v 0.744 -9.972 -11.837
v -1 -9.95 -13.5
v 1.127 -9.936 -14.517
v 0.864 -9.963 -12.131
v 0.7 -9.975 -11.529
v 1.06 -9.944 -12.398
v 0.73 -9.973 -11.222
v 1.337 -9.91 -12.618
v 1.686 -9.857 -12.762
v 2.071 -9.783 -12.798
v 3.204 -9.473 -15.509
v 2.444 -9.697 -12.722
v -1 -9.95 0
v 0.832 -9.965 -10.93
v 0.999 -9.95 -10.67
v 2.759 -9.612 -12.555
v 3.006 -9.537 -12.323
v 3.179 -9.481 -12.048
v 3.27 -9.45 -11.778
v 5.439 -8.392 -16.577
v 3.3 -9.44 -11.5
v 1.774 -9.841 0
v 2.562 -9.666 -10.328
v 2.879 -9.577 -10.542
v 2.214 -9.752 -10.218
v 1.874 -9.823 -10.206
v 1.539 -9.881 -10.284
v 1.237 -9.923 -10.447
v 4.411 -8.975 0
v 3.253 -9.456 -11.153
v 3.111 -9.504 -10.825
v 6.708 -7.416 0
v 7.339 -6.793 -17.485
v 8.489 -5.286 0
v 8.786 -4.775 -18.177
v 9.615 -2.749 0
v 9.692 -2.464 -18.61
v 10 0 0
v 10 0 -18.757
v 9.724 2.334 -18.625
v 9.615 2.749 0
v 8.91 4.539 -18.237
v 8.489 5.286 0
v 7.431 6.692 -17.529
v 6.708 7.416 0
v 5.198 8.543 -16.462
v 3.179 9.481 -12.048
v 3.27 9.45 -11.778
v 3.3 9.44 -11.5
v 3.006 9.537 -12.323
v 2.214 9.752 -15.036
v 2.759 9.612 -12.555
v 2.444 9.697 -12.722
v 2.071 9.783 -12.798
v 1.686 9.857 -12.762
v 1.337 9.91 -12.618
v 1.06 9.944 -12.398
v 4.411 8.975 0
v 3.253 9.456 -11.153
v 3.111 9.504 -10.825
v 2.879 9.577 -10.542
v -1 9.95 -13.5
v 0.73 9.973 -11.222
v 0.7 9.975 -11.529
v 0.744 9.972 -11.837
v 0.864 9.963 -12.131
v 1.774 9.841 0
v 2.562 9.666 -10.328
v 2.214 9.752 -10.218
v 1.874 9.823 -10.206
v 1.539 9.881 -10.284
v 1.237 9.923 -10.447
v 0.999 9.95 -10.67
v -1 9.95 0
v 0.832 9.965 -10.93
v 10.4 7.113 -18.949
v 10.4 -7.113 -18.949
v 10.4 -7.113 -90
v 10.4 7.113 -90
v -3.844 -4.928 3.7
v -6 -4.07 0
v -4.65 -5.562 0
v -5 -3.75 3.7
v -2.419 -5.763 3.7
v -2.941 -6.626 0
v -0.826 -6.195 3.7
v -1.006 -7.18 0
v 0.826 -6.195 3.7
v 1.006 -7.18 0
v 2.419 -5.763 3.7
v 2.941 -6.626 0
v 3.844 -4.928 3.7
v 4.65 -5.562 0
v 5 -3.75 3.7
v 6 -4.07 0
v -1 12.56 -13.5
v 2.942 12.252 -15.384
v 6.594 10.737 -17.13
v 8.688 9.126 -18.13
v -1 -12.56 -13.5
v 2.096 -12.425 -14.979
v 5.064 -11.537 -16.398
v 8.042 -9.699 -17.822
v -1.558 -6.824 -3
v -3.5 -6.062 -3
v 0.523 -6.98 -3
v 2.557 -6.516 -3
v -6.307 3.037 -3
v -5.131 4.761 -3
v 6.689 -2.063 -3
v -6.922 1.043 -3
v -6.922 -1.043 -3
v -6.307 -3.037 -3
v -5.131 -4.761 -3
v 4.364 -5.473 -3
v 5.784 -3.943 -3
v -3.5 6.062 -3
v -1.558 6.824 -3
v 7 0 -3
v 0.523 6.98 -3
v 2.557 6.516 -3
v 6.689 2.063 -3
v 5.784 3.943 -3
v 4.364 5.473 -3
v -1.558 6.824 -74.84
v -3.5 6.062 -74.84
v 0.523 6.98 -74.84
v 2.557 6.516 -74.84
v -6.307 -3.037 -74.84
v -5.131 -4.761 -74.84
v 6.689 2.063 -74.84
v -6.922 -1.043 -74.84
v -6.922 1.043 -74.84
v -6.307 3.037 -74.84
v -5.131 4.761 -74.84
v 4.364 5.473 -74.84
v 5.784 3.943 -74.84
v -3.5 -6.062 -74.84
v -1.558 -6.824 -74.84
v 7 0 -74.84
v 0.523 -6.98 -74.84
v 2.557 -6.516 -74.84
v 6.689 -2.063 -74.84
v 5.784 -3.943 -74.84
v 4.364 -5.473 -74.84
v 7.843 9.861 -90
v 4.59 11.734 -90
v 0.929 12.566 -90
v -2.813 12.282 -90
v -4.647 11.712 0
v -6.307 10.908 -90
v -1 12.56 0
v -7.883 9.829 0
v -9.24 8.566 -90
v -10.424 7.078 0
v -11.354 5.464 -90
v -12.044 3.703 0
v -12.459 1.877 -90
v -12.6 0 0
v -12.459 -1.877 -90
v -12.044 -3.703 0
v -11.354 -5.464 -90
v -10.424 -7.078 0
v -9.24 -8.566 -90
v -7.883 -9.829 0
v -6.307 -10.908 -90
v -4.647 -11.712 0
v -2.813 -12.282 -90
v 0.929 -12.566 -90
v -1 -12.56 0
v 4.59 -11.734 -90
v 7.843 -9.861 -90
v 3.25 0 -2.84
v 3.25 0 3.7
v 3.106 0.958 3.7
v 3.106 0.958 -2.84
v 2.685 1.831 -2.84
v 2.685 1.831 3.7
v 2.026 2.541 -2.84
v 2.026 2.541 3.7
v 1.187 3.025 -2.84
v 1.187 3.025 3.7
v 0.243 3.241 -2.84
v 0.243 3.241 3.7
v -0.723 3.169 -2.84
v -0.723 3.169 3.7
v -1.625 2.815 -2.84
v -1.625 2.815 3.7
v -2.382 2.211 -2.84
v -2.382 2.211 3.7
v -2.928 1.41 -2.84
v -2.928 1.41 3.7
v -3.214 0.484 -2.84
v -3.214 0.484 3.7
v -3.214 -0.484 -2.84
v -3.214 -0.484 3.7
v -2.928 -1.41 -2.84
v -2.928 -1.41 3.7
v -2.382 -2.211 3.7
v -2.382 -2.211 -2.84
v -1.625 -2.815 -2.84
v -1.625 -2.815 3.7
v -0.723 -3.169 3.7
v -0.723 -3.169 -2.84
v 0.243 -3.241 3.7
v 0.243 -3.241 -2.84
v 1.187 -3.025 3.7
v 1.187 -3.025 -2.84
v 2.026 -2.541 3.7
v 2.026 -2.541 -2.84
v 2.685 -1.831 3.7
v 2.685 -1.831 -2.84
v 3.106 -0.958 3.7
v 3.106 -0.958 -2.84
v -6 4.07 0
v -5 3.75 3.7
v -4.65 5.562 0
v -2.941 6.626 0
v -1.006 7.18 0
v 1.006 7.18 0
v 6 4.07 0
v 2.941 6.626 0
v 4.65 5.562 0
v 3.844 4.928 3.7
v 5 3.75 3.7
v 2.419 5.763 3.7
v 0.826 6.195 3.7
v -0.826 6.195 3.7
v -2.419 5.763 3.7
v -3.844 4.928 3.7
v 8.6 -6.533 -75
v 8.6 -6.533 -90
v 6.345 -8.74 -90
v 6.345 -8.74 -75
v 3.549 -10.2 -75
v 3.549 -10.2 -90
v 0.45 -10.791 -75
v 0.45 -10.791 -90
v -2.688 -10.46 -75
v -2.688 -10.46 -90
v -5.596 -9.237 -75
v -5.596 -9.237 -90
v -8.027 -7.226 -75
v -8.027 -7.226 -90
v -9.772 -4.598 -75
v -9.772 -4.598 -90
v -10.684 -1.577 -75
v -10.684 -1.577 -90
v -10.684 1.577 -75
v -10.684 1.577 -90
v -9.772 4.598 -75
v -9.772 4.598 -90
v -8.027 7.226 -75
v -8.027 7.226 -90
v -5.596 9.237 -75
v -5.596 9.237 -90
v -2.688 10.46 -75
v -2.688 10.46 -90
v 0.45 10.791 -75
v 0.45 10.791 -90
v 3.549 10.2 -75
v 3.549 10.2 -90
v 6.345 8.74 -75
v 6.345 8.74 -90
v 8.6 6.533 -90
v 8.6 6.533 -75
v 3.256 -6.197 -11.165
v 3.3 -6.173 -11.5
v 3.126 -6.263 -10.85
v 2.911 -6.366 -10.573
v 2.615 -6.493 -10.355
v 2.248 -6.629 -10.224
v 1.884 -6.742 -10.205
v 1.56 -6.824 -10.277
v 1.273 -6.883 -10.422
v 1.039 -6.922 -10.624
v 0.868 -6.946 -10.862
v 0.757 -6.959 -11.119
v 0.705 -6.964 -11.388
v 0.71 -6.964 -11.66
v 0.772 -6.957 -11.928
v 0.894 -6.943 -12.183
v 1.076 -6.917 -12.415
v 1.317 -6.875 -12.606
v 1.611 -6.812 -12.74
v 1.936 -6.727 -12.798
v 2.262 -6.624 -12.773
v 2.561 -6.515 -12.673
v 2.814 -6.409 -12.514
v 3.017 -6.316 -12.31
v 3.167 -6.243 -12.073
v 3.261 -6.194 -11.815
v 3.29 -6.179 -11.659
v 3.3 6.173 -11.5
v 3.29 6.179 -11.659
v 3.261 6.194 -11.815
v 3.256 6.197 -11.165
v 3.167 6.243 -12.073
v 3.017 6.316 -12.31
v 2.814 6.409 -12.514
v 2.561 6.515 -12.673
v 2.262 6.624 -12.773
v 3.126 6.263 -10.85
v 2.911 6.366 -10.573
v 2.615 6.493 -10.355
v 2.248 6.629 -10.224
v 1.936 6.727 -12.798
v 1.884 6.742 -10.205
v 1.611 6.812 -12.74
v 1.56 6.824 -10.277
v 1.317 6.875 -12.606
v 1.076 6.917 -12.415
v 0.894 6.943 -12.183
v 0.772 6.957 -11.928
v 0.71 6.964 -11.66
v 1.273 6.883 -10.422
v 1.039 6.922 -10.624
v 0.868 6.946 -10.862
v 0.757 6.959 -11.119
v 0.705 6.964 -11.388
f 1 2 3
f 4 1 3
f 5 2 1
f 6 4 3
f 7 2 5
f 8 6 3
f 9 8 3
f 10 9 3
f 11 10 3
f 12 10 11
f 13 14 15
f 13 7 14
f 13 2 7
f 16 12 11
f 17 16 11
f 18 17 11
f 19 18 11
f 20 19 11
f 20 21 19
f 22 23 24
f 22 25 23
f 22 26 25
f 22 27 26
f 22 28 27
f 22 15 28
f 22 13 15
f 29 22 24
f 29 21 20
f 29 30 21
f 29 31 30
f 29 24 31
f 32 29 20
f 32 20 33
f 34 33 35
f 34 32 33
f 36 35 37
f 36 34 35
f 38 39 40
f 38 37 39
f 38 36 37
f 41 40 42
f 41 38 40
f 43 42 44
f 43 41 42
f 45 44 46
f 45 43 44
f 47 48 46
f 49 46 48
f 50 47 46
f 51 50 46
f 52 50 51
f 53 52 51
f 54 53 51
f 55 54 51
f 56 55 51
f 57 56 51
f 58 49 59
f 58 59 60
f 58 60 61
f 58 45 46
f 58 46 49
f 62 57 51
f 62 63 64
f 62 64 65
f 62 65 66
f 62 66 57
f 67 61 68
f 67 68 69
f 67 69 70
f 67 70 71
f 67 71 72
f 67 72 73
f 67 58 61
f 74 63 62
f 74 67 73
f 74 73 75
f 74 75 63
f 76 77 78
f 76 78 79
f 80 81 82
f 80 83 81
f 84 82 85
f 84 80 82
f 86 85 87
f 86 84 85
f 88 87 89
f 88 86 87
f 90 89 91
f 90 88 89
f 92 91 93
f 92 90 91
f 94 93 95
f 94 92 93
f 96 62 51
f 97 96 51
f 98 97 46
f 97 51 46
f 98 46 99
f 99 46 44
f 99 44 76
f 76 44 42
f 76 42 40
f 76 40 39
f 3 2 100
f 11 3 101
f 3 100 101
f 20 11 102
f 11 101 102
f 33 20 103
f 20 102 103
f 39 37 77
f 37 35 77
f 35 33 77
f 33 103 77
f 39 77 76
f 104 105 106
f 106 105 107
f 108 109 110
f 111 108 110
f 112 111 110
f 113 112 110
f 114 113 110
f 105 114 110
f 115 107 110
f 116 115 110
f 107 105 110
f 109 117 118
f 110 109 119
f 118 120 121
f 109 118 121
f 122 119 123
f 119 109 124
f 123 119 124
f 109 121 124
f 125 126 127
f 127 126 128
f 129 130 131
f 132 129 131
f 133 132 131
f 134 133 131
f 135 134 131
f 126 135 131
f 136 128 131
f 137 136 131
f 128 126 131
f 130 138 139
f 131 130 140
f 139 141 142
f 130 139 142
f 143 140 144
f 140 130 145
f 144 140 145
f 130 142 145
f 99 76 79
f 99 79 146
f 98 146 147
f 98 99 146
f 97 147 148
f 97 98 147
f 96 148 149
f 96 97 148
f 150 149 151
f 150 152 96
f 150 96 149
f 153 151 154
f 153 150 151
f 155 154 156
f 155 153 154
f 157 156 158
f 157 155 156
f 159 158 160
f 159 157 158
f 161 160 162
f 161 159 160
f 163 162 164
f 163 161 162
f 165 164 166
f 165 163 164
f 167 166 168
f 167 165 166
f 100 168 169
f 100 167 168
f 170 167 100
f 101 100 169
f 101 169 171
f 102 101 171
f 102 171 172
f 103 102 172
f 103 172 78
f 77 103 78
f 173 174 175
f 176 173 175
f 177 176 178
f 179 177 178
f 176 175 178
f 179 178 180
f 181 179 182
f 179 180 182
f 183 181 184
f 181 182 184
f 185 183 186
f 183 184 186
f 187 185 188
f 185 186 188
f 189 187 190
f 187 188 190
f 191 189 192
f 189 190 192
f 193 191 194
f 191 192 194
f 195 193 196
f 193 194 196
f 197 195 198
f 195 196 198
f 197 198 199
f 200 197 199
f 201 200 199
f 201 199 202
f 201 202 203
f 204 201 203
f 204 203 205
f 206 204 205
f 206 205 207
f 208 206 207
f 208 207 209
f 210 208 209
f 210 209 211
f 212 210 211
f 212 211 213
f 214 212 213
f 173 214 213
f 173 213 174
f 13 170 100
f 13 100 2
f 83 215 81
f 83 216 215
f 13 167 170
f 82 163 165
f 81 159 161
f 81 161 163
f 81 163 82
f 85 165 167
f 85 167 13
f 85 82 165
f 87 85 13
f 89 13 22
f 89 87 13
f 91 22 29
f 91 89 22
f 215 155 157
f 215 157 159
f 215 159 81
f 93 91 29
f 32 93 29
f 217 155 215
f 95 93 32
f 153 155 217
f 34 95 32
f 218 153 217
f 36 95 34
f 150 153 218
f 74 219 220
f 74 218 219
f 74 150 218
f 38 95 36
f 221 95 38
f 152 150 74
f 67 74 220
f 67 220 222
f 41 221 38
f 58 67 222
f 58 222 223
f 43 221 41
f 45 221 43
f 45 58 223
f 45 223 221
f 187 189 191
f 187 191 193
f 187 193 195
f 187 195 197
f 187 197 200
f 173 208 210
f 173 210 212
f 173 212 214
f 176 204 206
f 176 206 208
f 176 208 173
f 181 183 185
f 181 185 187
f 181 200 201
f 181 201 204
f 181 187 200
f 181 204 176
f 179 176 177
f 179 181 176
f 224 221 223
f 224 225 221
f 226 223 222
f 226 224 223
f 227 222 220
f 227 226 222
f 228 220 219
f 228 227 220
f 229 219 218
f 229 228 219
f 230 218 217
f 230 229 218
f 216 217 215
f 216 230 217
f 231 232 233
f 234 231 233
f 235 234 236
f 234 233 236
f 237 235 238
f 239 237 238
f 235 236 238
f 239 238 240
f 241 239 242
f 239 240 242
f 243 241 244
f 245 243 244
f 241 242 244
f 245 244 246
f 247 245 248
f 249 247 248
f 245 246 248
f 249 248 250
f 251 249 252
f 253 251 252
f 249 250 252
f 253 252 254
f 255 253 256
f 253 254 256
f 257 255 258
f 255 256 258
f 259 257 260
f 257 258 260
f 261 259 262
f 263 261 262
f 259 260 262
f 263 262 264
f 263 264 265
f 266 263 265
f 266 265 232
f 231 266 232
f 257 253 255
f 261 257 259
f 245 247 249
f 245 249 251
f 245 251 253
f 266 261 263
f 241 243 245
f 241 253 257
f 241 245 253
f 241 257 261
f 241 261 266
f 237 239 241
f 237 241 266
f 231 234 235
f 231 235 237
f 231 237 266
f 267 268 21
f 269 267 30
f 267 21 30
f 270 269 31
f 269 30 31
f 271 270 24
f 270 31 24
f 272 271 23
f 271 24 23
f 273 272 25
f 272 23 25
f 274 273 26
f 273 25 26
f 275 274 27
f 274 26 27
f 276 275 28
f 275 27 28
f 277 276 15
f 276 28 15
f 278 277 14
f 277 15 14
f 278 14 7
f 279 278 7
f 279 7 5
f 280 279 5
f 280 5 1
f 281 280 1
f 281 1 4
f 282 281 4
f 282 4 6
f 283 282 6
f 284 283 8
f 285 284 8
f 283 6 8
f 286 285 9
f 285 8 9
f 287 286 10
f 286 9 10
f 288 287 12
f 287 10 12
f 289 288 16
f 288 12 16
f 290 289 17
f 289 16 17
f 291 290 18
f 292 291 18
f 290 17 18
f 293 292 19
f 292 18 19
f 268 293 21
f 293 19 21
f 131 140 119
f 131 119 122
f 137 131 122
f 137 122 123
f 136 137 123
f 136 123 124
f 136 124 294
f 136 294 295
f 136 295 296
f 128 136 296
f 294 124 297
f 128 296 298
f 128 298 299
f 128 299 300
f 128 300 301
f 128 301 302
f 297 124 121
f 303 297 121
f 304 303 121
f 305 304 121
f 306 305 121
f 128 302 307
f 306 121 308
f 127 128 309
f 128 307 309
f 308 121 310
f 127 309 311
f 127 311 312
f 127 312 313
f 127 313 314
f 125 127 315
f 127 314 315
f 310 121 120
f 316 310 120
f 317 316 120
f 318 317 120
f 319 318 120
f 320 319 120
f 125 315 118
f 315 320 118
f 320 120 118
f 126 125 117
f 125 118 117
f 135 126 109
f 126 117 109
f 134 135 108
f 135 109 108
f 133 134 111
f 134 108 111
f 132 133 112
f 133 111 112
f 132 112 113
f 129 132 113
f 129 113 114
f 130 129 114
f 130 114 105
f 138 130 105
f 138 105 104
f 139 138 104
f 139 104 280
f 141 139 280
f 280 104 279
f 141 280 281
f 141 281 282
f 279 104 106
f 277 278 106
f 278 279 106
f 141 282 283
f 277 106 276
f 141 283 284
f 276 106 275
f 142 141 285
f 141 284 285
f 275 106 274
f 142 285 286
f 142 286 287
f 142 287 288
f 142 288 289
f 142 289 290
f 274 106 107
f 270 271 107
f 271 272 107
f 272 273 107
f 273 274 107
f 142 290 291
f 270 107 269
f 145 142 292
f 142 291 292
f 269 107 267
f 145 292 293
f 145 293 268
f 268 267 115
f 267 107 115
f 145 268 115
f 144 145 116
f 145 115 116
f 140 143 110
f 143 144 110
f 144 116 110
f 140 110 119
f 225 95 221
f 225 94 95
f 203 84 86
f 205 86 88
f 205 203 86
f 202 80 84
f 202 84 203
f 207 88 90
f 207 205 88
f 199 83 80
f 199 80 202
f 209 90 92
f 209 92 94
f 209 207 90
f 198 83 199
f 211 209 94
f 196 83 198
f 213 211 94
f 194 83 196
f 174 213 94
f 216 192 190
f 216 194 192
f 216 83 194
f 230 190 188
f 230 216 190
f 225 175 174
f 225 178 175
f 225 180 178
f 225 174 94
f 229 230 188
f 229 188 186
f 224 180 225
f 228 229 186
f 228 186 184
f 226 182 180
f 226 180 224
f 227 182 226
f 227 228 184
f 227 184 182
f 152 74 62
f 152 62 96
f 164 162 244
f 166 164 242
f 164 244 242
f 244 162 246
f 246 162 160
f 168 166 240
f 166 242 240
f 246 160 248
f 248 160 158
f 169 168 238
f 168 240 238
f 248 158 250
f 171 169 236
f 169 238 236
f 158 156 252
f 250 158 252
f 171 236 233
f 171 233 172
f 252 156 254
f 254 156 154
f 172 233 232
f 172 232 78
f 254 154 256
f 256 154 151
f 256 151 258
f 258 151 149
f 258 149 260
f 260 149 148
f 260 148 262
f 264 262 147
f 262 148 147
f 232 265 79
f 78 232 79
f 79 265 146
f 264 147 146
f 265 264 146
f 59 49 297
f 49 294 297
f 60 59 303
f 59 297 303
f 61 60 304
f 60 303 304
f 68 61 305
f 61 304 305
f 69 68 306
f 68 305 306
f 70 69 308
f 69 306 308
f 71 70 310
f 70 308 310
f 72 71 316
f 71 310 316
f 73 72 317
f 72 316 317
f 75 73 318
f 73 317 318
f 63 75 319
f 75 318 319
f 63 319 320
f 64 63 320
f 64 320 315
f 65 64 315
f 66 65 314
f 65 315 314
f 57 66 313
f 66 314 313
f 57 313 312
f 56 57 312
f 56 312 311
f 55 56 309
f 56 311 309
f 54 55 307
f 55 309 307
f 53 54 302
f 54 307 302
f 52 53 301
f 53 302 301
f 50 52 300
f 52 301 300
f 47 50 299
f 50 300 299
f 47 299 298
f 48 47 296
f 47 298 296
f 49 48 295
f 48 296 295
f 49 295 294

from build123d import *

# Parameters (mm, degrees)
F1_DEPTH  = 13.5
F3_R      = 12.6
F4_DEPTH  = 6.5
F6_DEPTH  = 15
F7_DEPTH  = 6.5
F8_DEPTH  = 70
F10_DEPTH = 90
F12_DEPTH = 15
F17_R     = 3.25
F18_DEPTH = 93.701
F20_R     = 7
F21_DEPTH = 90
F22_R     = 7
F23_DEPTH = 0.16
F24_R     = 7
F25_DEPTH = 0.16
F26_R     = 1.3
F27_DEPTH = 12.5


with BuildPart() as f1:
    # F0 (on Top) → F1 (new body)
    with BuildSketch(Plane.XY):
        with BuildLine():
            ThreePointArc((-1, -9.9498743711), (-10, 0), (-1, 9.9498743711))
            Line((-1, 9.9498743711), (-1, 12.5602547745))
            ThreePointArc((-1, 12.5602547745), (-12.6, 0), (-1, -12.5602547745))
            Line((-1, -12.5602547745), (-1, -9.9498743711))
        make_face()
        with BuildLine():
            ThreePointArc((-1, -9.9498743711), (6.7082039325, -7.4161984871), (10, 0))
            ThreePointArc((10, 0), (6.7082039325, 7.4161984871), (-1, 9.9498743711))
            ThreePointArc((-1, 9.9498743711), (-10, 0), (-1, -9.9498743711))
        make_face()
    extrude(amount=-F1_DEPTH)

    # F3 (on offset) → F4 (join)
    with BuildSketch(Plane.XY.offset(-20)):
        Circle(F3_R)
    extrude(amount=F4_DEPTH)

    # F5 (on Front) → F6 (cut, symmetric)
    with BuildSketch(Plane.XZ):
        Polygon((12.6, -13.5), (-1, -13.5), (12.6, -20), align=None)
    extrude(amount=F6_DEPTH, both=True, mode=Mode.SUBTRACT)

    # F7 (add): a face of the model
    f7_faces = [f1.faces().sort_by_distance(p)[0] for p in [
        (3.7091534646, 0, -13.5),
    ]]
    extrude(f7_faces, amount=F7_DEPTH)

    # F8 (add): a face of the model
    f8_faces = [f1.faces().sort_by_distance(p)[0] for p in [
        (0, 0, -20),
    ]]
    extrude(f8_faces, amount=F8_DEPTH)

    # F9 (on face) → F10 (cut)
    with BuildSketch(Plane(origin=(0, 0, -90), x_dir=(1, 0, 0), z_dir=(0, 0, -1))):
        with BuildLine():
            Line((10.4, 7.1133676975), (10.4, 0))
            Line((10.4, 0), (10.4, -7.1133676975))
            ThreePointArc((10.4, -7.1133676975), (12.0374415886, -3.7229020938), (12.6, 0))
            ThreePointArc((12.6, 0), (12.0374415886, 3.7229020938), (10.4, 7.1133676975))
        make_face()
    extrude(amount=-F10_DEPTH, mode=Mode.SUBTRACT)

    # F11 (on face) → F12 (cut)
    with BuildSketch(Plane(origin=(0, 0, -90), x_dir=(1, 0, 0), z_dir=(0, 0, -1))):
        with BuildLine():
            ThreePointArc((8.6, 6.5329931884), (-10.8, 0), (8.6, -6.5329931884))
            Line((8.6, -6.5329931884), (8.6, 6.5329931884))
        make_face()
    extrude(amount=-F12_DEPTH, mode=Mode.SUBTRACT)

    # F13 (on face) → F16 section 0
    with BuildSketch(Plane.XY):
        with BuildLine():
            Line((6, 0), (6, 4.069705149))
            ThreePointArc((6, 4.069705149), (0, 7.25), (-6, 4.069705149))
            Line((-6, 4.069705149), (-6, 0))
            Line((-6, 0), (-6, -4.069705149))
            ThreePointArc((-6, -4.069705149), (0, -7.25), (6, -4.069705149))
            Line((6, -4.069705149), (6, 0))
        make_face()
    # F15 (on offset) → F16 section 1
    with BuildSketch(Plane.XY.offset(3.7)):
        with BuildLine():
            Line((5, 0), (5, 3.75))
            ThreePointArc((5, 3.75), (0, 6.25), (-5, 3.75))
            Line((-5, 3.75), (-5, 0))
            Line((-5, 0), (-5, -3.75))
            ThreePointArc((-5, -3.75), (0, -6.25), (5, -3.75))
            Line((5, -3.75), (5, 0))
        make_face()
    loft()

    # F17 (on offset) → F18 (cut, through all)
    with BuildSketch(Plane.XY.offset(3.7)):
        Circle(F17_R)
    extrude(amount=-F18_DEPTH, mode=Mode.SUBTRACT)

    # F20 (on offset) → F21 (cut)
    with BuildSketch(Plane.XY.offset(-3)):
        Circle(F20_R)
    extrude(amount=-F21_DEPTH, mode=Mode.SUBTRACT)

    # F22 (on face) → F23 (join)
    with BuildSketch(Plane(origin=(0, 0, -75), x_dir=(1, 0, 0), z_dir=(0, 0, -1))):
        Circle(F22_R)
    extrude(amount=-F23_DEPTH)

    # F24 (on offset) → F25 (join)
    with BuildSketch(Plane.XY.offset(-3)):
        Circle(F24_R)
    extrude(amount=F25_DEPTH)

    # F26 (on Front) → F27 (cut, symmetric)
    with BuildSketch(Plane.XZ):
        with Locations((2, -11.5)):
            Circle(F26_R)
    extrude(amount=F27_DEPTH, both=True, mode=Mode.SUBTRACT)


solid = f1.part
